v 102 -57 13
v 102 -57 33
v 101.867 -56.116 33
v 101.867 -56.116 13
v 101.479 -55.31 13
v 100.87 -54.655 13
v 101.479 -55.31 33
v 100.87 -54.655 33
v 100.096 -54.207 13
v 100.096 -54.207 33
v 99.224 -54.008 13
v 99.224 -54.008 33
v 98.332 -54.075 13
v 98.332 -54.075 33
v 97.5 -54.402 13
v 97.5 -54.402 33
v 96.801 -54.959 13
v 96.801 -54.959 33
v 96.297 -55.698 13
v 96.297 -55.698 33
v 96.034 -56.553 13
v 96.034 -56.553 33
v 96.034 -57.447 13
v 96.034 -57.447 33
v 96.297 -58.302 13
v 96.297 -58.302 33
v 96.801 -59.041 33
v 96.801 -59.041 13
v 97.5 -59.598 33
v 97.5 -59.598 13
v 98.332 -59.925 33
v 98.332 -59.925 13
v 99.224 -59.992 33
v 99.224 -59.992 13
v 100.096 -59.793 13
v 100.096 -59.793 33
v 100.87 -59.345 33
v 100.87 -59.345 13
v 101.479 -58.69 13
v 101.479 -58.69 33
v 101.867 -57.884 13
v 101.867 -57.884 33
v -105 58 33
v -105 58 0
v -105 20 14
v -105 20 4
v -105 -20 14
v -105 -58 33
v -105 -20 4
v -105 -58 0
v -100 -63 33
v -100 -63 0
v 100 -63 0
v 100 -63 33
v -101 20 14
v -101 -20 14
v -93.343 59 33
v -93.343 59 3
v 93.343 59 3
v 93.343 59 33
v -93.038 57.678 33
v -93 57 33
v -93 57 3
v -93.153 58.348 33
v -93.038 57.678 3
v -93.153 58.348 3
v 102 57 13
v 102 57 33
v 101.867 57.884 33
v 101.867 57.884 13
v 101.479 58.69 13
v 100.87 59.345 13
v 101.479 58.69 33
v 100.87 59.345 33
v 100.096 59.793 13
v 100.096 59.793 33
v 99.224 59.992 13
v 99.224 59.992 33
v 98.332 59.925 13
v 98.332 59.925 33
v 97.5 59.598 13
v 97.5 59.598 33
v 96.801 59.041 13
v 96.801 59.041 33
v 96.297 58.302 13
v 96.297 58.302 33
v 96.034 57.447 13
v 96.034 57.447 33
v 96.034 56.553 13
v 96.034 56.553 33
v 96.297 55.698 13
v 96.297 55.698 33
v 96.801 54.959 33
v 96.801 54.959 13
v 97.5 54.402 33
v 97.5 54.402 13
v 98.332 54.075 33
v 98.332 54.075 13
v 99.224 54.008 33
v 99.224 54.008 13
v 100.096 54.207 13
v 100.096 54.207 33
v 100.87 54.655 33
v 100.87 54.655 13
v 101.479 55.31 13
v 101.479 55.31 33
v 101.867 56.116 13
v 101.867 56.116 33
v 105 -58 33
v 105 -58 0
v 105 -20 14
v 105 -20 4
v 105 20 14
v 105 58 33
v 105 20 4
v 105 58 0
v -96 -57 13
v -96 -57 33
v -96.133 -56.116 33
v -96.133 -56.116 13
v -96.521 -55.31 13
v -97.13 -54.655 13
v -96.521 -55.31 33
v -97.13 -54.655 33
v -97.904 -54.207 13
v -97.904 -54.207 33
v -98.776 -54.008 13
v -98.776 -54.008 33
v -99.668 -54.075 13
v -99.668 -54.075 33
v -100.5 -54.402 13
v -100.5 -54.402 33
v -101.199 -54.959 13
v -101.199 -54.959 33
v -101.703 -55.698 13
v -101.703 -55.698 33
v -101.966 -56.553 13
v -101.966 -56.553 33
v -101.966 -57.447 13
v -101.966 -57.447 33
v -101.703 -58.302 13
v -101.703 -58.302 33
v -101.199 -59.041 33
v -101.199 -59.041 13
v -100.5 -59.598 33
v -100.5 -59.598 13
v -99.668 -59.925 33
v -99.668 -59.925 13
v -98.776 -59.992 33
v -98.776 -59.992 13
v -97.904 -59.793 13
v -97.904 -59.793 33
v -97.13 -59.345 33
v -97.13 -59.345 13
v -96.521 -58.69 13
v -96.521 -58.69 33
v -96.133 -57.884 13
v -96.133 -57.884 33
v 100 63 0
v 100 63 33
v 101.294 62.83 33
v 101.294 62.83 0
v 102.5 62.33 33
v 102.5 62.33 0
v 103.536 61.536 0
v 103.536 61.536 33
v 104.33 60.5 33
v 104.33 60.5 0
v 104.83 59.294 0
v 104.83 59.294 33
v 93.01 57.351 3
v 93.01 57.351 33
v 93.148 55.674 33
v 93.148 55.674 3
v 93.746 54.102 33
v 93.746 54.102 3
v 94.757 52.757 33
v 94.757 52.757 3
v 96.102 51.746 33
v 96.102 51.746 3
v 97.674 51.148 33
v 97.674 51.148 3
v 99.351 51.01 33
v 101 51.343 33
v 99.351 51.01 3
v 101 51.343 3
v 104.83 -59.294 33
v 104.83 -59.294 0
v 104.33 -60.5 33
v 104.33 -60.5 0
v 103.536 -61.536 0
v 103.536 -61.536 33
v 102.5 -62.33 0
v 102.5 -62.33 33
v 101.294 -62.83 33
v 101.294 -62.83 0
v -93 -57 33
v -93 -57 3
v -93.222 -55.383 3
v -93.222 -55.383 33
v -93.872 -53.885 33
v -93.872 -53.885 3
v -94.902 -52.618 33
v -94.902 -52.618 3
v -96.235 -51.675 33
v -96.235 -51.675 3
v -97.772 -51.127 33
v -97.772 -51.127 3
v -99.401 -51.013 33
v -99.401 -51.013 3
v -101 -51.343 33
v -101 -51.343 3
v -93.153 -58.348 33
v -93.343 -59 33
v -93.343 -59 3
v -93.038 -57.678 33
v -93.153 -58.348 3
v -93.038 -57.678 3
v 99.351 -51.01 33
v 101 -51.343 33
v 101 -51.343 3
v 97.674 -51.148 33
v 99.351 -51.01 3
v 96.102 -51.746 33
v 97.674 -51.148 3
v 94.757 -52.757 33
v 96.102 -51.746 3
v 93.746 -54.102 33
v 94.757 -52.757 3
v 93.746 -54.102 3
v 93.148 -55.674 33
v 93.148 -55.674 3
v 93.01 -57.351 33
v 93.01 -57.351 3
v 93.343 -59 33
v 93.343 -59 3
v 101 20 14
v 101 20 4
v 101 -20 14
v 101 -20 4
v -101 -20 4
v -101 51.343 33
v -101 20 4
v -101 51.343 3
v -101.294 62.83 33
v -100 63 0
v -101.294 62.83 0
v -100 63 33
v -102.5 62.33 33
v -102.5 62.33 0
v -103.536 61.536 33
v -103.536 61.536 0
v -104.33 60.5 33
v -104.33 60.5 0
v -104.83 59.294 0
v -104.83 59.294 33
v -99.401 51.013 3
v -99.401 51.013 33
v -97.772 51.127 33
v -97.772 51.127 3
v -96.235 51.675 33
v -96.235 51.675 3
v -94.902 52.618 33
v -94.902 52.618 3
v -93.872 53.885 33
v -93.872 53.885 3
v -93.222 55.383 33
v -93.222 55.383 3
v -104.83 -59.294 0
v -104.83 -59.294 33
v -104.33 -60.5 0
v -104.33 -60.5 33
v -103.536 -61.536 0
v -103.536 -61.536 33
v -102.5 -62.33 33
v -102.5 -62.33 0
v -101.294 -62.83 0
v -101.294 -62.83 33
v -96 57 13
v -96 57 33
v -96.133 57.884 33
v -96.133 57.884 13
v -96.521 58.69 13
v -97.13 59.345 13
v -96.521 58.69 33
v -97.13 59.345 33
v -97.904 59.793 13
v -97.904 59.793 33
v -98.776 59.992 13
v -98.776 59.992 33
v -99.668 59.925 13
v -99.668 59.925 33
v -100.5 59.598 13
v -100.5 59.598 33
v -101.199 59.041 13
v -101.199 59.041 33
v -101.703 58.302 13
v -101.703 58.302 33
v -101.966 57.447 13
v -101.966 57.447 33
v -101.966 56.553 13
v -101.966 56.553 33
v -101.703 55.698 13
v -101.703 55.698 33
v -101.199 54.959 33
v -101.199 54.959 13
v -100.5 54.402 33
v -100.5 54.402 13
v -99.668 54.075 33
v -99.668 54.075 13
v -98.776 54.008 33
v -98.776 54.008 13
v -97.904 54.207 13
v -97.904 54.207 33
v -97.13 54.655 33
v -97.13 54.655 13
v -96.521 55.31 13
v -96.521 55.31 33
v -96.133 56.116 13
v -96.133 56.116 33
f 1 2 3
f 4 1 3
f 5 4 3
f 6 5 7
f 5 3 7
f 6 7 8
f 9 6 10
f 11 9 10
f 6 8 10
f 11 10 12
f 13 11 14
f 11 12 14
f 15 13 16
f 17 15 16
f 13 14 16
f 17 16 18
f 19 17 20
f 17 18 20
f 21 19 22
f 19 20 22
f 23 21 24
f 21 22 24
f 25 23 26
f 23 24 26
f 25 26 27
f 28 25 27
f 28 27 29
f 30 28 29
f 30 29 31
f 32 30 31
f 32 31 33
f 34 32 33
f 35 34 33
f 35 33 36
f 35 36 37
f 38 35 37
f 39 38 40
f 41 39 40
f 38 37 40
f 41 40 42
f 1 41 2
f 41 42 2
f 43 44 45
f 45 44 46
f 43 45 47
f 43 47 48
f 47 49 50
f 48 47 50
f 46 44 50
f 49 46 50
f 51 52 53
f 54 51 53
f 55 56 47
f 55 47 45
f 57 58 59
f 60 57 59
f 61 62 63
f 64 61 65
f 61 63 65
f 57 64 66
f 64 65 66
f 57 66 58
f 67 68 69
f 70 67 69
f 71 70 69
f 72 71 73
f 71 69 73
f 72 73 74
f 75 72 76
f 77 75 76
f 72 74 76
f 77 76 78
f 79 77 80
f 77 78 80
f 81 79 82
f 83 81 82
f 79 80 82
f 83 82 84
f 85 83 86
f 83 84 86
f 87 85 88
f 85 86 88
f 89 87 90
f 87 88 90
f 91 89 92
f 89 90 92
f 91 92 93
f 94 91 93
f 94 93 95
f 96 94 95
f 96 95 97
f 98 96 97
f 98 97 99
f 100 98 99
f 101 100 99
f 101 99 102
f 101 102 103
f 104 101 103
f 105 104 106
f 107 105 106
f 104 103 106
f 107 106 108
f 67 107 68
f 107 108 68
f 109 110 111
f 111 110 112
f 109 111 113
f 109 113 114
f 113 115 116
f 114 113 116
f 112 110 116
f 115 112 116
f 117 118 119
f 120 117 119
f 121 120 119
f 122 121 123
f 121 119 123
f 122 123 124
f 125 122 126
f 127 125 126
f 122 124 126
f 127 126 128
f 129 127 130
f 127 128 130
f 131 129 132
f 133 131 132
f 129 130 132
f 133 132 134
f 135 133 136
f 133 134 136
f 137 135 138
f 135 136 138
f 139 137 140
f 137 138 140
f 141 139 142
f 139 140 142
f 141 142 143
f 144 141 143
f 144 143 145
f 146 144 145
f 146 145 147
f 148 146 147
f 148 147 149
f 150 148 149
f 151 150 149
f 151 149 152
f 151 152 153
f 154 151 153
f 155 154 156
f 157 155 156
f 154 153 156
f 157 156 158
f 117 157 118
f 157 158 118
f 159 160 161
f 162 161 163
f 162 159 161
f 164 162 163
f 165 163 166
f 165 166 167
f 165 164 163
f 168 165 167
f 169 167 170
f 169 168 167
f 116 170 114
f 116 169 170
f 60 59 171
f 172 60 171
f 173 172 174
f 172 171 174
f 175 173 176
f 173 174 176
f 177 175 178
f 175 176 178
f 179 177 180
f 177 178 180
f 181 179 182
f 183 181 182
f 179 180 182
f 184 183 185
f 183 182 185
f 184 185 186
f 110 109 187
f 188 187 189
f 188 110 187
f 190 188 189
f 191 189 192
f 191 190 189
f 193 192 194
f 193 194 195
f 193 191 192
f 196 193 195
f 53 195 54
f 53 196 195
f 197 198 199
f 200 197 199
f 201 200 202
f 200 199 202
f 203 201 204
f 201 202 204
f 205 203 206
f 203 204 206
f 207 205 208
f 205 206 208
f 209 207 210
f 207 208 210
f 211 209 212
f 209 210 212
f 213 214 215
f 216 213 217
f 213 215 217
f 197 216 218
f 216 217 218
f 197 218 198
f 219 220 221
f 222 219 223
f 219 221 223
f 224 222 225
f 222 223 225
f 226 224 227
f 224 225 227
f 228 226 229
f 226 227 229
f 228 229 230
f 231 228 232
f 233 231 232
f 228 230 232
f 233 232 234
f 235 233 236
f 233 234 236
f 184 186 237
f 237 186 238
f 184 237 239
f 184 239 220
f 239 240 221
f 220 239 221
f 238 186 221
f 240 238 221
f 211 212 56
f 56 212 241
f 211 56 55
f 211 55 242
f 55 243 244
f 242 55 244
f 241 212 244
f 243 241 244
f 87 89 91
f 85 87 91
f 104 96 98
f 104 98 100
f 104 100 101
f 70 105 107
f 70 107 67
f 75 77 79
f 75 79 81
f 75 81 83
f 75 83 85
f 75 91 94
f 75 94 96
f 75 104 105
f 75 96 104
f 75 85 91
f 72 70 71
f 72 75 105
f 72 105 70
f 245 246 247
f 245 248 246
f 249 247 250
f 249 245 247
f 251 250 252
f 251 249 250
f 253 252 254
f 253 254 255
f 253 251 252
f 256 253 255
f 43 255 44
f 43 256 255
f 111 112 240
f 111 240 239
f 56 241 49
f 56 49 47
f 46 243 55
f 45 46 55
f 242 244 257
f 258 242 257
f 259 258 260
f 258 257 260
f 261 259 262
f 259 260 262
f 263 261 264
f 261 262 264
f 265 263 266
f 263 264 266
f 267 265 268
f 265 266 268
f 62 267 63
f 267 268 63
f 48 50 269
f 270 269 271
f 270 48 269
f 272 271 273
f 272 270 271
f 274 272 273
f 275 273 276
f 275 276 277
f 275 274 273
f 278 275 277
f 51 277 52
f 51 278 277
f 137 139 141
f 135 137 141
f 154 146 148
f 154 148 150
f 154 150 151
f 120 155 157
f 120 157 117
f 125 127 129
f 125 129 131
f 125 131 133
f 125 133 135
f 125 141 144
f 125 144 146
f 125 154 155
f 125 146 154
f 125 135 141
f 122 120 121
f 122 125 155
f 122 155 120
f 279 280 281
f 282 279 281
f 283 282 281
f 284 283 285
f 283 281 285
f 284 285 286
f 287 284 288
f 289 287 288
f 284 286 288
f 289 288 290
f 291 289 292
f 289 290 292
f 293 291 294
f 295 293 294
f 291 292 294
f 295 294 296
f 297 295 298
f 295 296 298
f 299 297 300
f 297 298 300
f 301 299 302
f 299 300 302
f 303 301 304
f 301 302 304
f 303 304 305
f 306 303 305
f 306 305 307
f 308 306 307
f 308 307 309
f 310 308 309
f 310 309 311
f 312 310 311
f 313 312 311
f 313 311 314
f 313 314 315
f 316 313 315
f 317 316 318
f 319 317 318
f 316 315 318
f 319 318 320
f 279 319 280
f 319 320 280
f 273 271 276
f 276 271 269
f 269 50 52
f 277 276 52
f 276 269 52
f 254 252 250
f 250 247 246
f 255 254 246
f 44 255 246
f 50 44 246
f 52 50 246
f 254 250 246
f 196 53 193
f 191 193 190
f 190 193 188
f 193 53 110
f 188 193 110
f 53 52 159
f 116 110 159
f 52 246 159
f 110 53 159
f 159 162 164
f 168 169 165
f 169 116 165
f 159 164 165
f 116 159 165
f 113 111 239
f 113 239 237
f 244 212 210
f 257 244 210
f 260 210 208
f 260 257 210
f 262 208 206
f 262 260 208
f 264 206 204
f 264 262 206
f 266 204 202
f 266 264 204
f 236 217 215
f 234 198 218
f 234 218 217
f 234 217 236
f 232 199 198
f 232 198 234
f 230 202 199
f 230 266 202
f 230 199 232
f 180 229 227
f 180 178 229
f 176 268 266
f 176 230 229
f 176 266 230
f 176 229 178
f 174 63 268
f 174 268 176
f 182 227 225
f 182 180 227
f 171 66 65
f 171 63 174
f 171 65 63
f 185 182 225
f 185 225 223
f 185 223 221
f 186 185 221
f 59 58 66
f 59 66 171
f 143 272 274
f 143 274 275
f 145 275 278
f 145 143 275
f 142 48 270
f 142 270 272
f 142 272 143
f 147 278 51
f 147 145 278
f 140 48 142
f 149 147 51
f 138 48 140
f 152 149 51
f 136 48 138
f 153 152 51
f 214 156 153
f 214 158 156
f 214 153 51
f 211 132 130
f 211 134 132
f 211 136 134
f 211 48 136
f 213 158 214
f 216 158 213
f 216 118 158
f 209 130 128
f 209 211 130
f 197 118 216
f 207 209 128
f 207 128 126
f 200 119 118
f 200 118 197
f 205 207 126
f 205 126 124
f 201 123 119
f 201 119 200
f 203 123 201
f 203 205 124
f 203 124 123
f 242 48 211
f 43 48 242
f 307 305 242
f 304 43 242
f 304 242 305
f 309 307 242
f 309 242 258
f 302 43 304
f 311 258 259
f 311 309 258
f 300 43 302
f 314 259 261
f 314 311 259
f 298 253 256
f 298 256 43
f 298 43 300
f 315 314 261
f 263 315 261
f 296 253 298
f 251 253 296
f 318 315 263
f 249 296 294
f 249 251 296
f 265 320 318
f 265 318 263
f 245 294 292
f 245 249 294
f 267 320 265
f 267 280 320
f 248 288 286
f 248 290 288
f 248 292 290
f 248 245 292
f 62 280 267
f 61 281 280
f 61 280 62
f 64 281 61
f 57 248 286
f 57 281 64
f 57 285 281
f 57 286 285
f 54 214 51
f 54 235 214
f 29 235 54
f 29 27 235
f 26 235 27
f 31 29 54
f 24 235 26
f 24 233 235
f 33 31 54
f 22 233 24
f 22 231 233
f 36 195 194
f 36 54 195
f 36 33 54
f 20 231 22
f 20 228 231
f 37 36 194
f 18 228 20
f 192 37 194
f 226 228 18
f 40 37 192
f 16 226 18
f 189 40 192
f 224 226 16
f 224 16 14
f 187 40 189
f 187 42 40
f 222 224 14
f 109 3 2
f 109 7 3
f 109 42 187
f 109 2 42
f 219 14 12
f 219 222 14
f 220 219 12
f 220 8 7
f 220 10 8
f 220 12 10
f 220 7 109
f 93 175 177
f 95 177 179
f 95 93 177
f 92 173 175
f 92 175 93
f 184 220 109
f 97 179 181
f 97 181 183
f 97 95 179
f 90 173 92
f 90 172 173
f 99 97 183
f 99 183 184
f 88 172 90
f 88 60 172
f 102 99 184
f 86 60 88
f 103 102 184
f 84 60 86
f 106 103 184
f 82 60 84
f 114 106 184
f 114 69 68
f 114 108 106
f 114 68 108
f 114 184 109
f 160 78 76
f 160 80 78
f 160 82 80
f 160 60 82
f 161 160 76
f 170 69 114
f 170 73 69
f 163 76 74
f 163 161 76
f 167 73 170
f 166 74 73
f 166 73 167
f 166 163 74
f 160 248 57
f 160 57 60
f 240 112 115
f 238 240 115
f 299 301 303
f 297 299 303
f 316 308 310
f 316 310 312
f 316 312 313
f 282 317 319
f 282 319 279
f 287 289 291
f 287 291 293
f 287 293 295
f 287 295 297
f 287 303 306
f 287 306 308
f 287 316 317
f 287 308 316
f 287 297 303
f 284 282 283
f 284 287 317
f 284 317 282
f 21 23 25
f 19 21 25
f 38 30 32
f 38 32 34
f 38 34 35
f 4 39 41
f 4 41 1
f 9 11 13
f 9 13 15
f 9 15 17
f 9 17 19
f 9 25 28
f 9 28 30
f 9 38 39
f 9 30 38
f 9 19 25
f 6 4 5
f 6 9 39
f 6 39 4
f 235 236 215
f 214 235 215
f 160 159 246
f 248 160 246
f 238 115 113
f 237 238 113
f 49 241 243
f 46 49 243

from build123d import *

# Parameters (mm, degrees)
F1_DEPTH = 33
F2_W     = 210
F2_H     = 126
F3_DEPTH = 3
F4_W     = 40
F4_H     = 10
F5_DEPTH = 210.001
F6_R     = 5
F7_R     = 3
F8_DEPTH = 20


with BuildPart() as f1:
    # F0 (on Top) → F1 (new body)
    with BuildSketch(Plane.XY):
        with BuildLine():
            Line((105, 57), (105, 63))
            Line((105, 63), (99, 63))
            ThreePointArc((99, 63), (103.2426406871, 61.2426406871), (105, 57))
        make_face()
        with BuildLine():
            ThreePointArc((-105, 57), (-103.2426406871, 61.2426406871), (-99, 63))
            Line((-99, 63), (-105, 63))
            Line((-105, 63), (-105, 57))
        make_face()
        with BuildLine():
            Line((105, -63), (105, -57))
            ThreePointArc((105, -57), (103.2426406871, -61.2426406871), (99, -63))
            Line((99, -63), (105, -63))
        make_face()
        with BuildLine():
            ThreePointArc((-99, -63), (-103.242640668, -61.2426407063), (-105, -57.0000000541))
            Line((-105, -57.0000000541), (-105, -63))
            Line((-105, -63), (-99, -63))
        make_face()
        with BuildLine():
            Line((-99, -63), (99, -63))
            ThreePointArc((99, -63), (95.5358983849, -61.8989794856), (93.3431457505, -59))
            Line((93.3431457505, -59), (-93.3431457505, -59))
            ThreePointArc((-93.3431457505, -59), (-95.5358983849, -61.8989794856), (-99, -63))
        make_face()
        with BuildLine():
            Line((105, -57), (105, 57))
            ThreePointArc((105, 57), (103.8989794856, 53.5358983849), (101, 51.3431457505))
            Line((101, 51.3431457505), (101, -51.3431457505))
            ThreePointArc((101, -51.3431457505), (103.8989794856, -53.5358983849), (105, -57))
        make_face()
        with BuildLine():
            ThreePointArc((-101, 51.3431457505), (-103.8989794856, 53.5358983849), (-105, 57))
            Line((-105, 57), (-105, -57.0000000541))
            ThreePointArc((-105, -57.0000000541), (-103.8989795012, -53.535898407), (-101, -51.3431457505))
            Line((-101, -51.3431457505), (-101, 51.3431457505))
        make_face()
        with BuildLine():
            ThreePointArc((-93.3431457505, 59), (-95.5358983849, 61.8989794856), (-99, 63))
            ThreePointArc((-99, 63), (-103.2426406871, 61.2426406871), (-105, 57))
            ThreePointArc((-105, 57), (-103.8989794856, 53.5358983849), (-101, 51.3431457505))
            Line((-101, 51.3431457505), (-101, 59))
            Line((-101, 59), (-93.3431457505, 59))
        make_face()
        with BuildLine():
            ThreePointArc((-101, -51.3431457505), (-103.8989795012, -53.535898407), (-105, -57.0000000541))
            ThreePointArc((-105, -57.0000000541), (-103.242640668, -61.2426407063), (-99, -63))
            ThreePointArc((-99, -63), (-95.5358983849, -61.8989794856), (-93.3431457505, -59))
            Line((-93.3431457505, -59), (-101, -59))
            Line((-101, -59), (-101, -51.3431457505))
        make_face()
        with BuildLine():
            ThreePointArc((105, 57), (103.2426406871, 61.2426406871), (99, 63))
            ThreePointArc((99, 63), (95.5358983849, 61.8989794856), (93.3431457505, 59))
            Line((93.3431457505, 59), (101, 59))
            Line((101, 59), (101, 51.3431457505))
            ThreePointArc((101, 51.3431457505), (103.8989794856, 53.5358983849), (105, 57))
        make_face()
        with BuildLine():
            ThreePointArc((99, -63), (103.2426406871, -61.2426406871), (105, -57))
            ThreePointArc((105, -57), (103.8989794856, -53.5358983849), (101, -51.3431457505))
            Line((101, -51.3431457505), (101, -59))
            Line((101, -59), (93.3431457505, -59))
            ThreePointArc((93.3431457505, -59), (95.5358983849, -61.8989794856), (99, -63))
        make_face()
        with BuildLine():
            Line((101, 59), (93.3431457505, 59))
            ThreePointArc((93.3431457505, 59), (94.7573593129, 52.7573593129), (101, 51.3431457505))
            Line((101, 51.3431457505), (101, 59))
        make_face()
        with BuildLine():
            ThreePointArc((-93, 57), (-93.0864086421, 58.0146118724), (-93.3431457505, 59))
            Line((-93.3431457505, 59), (-101, 59))
            Line((-101, 59), (-101, 51.3431457505))
            ThreePointArc((-101, 51.3431457505), (-95.5358983849, 52.1010205144), (-93, 57))
        make_face()
        with BuildLine():
            ThreePointArc((-93, -57), (-95.5358983849, -52.1010205144), (-101, -51.3431457505))
            Line((-101, -51.3431457505), (-101, -59))
            Line((-101, -59), (-93.3431457505, -59))
            ThreePointArc((-93.3431457505, -59), (-93.0864086421, -58.0146118724), (-93, -57))
        make_face()
        with BuildLine():
            Line((101, -59), (101, -51.3431457505))
            ThreePointArc((101, -51.3431457505), (94.7573593129, -52.7573593129), (93.3431457505, -59))
            Line((93.3431457505, -59), (101, -59))
        make_face()
        with BuildLine():
            ThreePointArc((93.3431457505, 59), (95.5358983849, 61.8989794856), (99, 63))
            Line((99, 63), (-99, 63))
            ThreePointArc((-99, 63), (-95.5358983849, 61.8989794856), (-93.3431457505, 59))
            Line((-93.3431457505, 59), (93.3431457505, 59))
        make_face()
    extrude(amount=F1_DEPTH)

    # F2 (on Top) → F3 (join)
    with BuildSketch(Plane.XY):
        Rectangle(F2_W, F2_H)
    extrude(amount=F3_DEPTH)

    # F4 (on face) → F5 (cut, through all)
    with BuildSketch(Plane.YZ.offset(105)):
        with Locations((0, 9)):
            Rectangle(F4_W, F4_H)
    extrude(amount=-F5_DEPTH, mode=Mode.SUBTRACT)

    # F6
    f6_edges = [f1.edges().sort_by_distance(p)[0] for p in [
        (-105, 63, 16.5),
        (105, 63, 16.5),
        (105, -63, 16.5),
        (-105, -63, 16.5),
    ]]
    fillet(f6_edges, radius=F6_R)

    # F7 (on face) → F8 (cut)
    with BuildSketch(Plane.XY.offset(33)):
        with Locations((-99, 57)):
            Circle(F7_R)
        with Locations((99, 57)):
            Circle(F7_R)
        with Locations((99, -57)):
            Circle(F7_R)
        with Locations((-99, -57)):
            Circle(F7_R)
    extrude(amount=-F8_DEPTH, mode=Mode.SUBTRACT)


solid = f1.part
